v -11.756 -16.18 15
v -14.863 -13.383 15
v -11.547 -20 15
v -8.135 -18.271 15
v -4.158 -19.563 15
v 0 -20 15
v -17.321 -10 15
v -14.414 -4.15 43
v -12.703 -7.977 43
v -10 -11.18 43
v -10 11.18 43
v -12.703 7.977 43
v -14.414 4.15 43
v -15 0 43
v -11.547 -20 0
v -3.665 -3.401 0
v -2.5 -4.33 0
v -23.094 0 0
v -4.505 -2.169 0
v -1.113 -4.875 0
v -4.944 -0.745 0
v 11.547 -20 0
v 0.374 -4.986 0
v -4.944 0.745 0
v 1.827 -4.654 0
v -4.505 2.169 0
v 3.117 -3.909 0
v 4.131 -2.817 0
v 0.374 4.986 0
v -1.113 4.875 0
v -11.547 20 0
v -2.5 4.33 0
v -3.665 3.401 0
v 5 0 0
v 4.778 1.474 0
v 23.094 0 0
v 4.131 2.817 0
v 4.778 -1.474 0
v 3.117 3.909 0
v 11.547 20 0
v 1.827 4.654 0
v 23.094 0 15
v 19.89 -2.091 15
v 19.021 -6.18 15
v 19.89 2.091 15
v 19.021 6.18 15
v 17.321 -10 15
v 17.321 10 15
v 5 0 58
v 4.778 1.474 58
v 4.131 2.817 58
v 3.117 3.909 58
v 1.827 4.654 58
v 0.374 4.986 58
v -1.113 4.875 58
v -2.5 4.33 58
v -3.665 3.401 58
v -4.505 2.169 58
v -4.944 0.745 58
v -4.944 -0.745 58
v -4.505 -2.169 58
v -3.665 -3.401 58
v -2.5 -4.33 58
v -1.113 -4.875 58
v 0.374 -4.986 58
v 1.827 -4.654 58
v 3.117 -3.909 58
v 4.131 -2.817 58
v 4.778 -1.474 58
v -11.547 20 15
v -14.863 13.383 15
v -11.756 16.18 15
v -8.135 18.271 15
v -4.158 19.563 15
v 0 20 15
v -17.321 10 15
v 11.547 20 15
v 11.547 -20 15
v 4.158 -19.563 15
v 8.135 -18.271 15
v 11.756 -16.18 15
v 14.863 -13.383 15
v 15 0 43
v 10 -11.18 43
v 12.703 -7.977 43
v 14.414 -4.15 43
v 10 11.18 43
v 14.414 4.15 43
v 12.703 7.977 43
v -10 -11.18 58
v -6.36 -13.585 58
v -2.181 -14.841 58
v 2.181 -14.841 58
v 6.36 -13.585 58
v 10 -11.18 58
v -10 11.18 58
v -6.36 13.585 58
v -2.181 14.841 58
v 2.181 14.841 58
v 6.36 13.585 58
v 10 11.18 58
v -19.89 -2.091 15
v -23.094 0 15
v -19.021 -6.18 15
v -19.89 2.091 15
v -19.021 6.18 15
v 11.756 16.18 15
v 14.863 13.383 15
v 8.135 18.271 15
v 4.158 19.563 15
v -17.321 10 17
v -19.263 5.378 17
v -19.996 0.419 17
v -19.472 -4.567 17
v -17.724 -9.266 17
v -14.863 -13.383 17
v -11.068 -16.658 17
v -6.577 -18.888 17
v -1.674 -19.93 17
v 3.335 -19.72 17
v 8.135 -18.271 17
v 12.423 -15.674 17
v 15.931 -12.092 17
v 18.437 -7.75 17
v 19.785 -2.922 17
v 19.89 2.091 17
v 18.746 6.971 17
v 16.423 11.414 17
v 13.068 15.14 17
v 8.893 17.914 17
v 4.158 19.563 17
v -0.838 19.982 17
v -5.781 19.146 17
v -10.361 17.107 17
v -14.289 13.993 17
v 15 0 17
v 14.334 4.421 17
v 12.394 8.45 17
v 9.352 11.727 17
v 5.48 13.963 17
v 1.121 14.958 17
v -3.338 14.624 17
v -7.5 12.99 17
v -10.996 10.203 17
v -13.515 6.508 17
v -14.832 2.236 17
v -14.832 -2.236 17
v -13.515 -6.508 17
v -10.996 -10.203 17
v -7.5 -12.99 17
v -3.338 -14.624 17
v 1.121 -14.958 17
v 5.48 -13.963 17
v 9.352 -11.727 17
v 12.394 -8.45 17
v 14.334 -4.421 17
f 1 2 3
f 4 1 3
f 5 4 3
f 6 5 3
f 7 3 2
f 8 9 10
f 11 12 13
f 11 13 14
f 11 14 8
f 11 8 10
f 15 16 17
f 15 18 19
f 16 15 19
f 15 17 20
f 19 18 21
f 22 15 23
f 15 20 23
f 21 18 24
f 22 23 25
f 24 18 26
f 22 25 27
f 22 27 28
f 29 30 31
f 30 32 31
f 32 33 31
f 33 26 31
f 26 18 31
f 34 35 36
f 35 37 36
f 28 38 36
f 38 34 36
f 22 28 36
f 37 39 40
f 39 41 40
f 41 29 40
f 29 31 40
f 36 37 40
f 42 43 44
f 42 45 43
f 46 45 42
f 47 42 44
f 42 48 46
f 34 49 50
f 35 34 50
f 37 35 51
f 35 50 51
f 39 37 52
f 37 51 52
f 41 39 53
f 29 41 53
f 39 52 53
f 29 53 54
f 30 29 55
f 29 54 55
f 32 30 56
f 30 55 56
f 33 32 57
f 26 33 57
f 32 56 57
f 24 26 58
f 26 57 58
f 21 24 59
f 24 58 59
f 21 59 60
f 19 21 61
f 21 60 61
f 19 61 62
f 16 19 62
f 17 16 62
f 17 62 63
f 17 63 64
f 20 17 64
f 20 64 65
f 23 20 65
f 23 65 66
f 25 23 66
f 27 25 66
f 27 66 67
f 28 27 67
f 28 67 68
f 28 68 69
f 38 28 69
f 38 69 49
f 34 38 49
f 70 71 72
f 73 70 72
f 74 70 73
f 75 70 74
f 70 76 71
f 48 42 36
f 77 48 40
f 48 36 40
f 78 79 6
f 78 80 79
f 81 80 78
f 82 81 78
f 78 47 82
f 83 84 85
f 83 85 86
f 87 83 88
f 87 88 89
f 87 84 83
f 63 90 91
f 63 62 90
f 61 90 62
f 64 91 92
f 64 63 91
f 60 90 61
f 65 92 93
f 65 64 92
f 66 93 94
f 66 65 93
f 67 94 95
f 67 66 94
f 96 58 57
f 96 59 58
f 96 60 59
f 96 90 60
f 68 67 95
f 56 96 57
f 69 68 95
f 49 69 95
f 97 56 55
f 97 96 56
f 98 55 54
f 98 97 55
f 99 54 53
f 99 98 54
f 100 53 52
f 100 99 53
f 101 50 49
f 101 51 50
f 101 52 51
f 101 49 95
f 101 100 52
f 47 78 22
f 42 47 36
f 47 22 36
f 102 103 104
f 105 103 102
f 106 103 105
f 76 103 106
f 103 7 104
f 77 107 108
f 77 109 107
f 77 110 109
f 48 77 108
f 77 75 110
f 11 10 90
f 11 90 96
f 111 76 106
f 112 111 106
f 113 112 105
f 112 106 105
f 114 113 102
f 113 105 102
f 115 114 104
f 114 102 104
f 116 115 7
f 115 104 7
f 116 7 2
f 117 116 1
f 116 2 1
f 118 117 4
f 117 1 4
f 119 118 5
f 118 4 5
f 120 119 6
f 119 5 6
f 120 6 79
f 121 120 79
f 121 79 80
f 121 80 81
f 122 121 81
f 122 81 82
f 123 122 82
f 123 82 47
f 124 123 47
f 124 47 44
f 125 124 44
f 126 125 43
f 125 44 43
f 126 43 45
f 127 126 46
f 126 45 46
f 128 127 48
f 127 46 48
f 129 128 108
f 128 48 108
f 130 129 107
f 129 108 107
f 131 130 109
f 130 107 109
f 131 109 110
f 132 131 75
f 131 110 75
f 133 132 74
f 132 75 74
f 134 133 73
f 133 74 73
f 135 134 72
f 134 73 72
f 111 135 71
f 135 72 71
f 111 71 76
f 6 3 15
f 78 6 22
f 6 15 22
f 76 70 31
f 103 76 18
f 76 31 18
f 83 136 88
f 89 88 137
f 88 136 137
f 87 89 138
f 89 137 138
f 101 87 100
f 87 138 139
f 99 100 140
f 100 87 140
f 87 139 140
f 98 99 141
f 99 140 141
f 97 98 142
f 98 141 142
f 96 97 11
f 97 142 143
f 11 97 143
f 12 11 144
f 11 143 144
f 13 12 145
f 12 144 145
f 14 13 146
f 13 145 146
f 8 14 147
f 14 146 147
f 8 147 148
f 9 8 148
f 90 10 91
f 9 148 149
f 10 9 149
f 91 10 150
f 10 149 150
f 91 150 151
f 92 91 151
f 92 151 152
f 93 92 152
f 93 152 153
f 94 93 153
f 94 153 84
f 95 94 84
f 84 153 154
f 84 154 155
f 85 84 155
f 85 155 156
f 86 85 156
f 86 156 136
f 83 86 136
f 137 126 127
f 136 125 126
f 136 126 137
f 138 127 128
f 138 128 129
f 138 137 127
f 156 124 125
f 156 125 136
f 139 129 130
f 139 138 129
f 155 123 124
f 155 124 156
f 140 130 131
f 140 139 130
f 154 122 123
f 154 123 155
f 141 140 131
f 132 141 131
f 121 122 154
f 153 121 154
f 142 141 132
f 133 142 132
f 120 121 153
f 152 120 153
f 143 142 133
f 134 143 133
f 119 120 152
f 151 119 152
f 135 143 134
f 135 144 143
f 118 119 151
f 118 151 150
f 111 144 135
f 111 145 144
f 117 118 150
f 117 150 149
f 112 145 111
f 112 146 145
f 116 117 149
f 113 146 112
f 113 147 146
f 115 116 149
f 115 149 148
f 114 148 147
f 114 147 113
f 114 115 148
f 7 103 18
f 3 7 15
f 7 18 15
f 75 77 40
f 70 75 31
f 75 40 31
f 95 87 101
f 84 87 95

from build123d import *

# Parameters (mm, degrees)
BOSS_EXTRUDE5_DEPTH = 15
SKETCH4_R           = 20
BOSS_EXTRUDE6_DEPTH = 2
SKETCH5_R           = 15
BOSS_EXTRUDE7_DEPTH = 41
SKETCH6_R           = 5
CUT_EXTRUDE2_DEPTH  = 100
CUT_EXTRUDE3_START  = -15
CUT_EXTRUDE3_DEPTH  = 15


with BuildPart() as part:
    # Sketch1 → Boss-Extrude5 (new body)
    with BuildSketch(Plane.XY):
        Polygon((23.094010768, 0), (11.547005384, 20), (-11.547005384, 20), (-23.094010768, 0), (-11.547005384, -20), (11.547005384, -20), align=None)
    extrude(amount=BOSS_EXTRUDE5_DEPTH)

    # Sketch4 → Boss-Extrude6 (add)
    with BuildSketch(Plane.XY.offset(15)):
        with Locations(Location((0, 0, 0), (0, 0, 150))):
            Circle(SKETCH4_R)
    extrude(amount=BOSS_EXTRUDE6_DEPTH)

    # Sketch5 → Boss-Extrude7 (add)
    with BuildSketch(Plane.XY.offset(17)):
        Circle(SKETCH5_R)
    extrude(amount=BOSS_EXTRUDE7_DEPTH)

    # Sketch6 → Cut-Extrude2 (cut)
    with BuildSketch(Plane.XY.offset(58)):
        Circle(SKETCH6_R)
    extrude(amount=-CUT_EXTRUDE2_DEPTH, mode=Mode.SUBTRACT)

    # Sketch9 → Cut-Extrude3 (cut)
    with BuildSketch(Plane.XY.offset(58).offset(CUT_EXTRUDE3_START)):
        with BuildLine():
            Line((-10, -11.180339887), (-10, 0))
            Line((-10, 0), (-10, 11.180339887))
            ThreePointArc((-10, 11.180339887), (-15, 0), (-10, -11.180339887))
        make_face()
        with BuildLine():
            Line((10, 11.180339887), (10, 0))
            Line((10, 0), (10, -11.180339887))
            ThreePointArc((10, -11.180339887), (13.693063938, -6.123724357), (15, 0))
            ThreePointArc((15, 0), (13.693063938, 6.123724357), (10, 11.180339887))
        make_face()
    extrude(amount=CUT_EXTRUDE3_DEPTH, mode=Mode.SUBTRACT)


solid = part.part
